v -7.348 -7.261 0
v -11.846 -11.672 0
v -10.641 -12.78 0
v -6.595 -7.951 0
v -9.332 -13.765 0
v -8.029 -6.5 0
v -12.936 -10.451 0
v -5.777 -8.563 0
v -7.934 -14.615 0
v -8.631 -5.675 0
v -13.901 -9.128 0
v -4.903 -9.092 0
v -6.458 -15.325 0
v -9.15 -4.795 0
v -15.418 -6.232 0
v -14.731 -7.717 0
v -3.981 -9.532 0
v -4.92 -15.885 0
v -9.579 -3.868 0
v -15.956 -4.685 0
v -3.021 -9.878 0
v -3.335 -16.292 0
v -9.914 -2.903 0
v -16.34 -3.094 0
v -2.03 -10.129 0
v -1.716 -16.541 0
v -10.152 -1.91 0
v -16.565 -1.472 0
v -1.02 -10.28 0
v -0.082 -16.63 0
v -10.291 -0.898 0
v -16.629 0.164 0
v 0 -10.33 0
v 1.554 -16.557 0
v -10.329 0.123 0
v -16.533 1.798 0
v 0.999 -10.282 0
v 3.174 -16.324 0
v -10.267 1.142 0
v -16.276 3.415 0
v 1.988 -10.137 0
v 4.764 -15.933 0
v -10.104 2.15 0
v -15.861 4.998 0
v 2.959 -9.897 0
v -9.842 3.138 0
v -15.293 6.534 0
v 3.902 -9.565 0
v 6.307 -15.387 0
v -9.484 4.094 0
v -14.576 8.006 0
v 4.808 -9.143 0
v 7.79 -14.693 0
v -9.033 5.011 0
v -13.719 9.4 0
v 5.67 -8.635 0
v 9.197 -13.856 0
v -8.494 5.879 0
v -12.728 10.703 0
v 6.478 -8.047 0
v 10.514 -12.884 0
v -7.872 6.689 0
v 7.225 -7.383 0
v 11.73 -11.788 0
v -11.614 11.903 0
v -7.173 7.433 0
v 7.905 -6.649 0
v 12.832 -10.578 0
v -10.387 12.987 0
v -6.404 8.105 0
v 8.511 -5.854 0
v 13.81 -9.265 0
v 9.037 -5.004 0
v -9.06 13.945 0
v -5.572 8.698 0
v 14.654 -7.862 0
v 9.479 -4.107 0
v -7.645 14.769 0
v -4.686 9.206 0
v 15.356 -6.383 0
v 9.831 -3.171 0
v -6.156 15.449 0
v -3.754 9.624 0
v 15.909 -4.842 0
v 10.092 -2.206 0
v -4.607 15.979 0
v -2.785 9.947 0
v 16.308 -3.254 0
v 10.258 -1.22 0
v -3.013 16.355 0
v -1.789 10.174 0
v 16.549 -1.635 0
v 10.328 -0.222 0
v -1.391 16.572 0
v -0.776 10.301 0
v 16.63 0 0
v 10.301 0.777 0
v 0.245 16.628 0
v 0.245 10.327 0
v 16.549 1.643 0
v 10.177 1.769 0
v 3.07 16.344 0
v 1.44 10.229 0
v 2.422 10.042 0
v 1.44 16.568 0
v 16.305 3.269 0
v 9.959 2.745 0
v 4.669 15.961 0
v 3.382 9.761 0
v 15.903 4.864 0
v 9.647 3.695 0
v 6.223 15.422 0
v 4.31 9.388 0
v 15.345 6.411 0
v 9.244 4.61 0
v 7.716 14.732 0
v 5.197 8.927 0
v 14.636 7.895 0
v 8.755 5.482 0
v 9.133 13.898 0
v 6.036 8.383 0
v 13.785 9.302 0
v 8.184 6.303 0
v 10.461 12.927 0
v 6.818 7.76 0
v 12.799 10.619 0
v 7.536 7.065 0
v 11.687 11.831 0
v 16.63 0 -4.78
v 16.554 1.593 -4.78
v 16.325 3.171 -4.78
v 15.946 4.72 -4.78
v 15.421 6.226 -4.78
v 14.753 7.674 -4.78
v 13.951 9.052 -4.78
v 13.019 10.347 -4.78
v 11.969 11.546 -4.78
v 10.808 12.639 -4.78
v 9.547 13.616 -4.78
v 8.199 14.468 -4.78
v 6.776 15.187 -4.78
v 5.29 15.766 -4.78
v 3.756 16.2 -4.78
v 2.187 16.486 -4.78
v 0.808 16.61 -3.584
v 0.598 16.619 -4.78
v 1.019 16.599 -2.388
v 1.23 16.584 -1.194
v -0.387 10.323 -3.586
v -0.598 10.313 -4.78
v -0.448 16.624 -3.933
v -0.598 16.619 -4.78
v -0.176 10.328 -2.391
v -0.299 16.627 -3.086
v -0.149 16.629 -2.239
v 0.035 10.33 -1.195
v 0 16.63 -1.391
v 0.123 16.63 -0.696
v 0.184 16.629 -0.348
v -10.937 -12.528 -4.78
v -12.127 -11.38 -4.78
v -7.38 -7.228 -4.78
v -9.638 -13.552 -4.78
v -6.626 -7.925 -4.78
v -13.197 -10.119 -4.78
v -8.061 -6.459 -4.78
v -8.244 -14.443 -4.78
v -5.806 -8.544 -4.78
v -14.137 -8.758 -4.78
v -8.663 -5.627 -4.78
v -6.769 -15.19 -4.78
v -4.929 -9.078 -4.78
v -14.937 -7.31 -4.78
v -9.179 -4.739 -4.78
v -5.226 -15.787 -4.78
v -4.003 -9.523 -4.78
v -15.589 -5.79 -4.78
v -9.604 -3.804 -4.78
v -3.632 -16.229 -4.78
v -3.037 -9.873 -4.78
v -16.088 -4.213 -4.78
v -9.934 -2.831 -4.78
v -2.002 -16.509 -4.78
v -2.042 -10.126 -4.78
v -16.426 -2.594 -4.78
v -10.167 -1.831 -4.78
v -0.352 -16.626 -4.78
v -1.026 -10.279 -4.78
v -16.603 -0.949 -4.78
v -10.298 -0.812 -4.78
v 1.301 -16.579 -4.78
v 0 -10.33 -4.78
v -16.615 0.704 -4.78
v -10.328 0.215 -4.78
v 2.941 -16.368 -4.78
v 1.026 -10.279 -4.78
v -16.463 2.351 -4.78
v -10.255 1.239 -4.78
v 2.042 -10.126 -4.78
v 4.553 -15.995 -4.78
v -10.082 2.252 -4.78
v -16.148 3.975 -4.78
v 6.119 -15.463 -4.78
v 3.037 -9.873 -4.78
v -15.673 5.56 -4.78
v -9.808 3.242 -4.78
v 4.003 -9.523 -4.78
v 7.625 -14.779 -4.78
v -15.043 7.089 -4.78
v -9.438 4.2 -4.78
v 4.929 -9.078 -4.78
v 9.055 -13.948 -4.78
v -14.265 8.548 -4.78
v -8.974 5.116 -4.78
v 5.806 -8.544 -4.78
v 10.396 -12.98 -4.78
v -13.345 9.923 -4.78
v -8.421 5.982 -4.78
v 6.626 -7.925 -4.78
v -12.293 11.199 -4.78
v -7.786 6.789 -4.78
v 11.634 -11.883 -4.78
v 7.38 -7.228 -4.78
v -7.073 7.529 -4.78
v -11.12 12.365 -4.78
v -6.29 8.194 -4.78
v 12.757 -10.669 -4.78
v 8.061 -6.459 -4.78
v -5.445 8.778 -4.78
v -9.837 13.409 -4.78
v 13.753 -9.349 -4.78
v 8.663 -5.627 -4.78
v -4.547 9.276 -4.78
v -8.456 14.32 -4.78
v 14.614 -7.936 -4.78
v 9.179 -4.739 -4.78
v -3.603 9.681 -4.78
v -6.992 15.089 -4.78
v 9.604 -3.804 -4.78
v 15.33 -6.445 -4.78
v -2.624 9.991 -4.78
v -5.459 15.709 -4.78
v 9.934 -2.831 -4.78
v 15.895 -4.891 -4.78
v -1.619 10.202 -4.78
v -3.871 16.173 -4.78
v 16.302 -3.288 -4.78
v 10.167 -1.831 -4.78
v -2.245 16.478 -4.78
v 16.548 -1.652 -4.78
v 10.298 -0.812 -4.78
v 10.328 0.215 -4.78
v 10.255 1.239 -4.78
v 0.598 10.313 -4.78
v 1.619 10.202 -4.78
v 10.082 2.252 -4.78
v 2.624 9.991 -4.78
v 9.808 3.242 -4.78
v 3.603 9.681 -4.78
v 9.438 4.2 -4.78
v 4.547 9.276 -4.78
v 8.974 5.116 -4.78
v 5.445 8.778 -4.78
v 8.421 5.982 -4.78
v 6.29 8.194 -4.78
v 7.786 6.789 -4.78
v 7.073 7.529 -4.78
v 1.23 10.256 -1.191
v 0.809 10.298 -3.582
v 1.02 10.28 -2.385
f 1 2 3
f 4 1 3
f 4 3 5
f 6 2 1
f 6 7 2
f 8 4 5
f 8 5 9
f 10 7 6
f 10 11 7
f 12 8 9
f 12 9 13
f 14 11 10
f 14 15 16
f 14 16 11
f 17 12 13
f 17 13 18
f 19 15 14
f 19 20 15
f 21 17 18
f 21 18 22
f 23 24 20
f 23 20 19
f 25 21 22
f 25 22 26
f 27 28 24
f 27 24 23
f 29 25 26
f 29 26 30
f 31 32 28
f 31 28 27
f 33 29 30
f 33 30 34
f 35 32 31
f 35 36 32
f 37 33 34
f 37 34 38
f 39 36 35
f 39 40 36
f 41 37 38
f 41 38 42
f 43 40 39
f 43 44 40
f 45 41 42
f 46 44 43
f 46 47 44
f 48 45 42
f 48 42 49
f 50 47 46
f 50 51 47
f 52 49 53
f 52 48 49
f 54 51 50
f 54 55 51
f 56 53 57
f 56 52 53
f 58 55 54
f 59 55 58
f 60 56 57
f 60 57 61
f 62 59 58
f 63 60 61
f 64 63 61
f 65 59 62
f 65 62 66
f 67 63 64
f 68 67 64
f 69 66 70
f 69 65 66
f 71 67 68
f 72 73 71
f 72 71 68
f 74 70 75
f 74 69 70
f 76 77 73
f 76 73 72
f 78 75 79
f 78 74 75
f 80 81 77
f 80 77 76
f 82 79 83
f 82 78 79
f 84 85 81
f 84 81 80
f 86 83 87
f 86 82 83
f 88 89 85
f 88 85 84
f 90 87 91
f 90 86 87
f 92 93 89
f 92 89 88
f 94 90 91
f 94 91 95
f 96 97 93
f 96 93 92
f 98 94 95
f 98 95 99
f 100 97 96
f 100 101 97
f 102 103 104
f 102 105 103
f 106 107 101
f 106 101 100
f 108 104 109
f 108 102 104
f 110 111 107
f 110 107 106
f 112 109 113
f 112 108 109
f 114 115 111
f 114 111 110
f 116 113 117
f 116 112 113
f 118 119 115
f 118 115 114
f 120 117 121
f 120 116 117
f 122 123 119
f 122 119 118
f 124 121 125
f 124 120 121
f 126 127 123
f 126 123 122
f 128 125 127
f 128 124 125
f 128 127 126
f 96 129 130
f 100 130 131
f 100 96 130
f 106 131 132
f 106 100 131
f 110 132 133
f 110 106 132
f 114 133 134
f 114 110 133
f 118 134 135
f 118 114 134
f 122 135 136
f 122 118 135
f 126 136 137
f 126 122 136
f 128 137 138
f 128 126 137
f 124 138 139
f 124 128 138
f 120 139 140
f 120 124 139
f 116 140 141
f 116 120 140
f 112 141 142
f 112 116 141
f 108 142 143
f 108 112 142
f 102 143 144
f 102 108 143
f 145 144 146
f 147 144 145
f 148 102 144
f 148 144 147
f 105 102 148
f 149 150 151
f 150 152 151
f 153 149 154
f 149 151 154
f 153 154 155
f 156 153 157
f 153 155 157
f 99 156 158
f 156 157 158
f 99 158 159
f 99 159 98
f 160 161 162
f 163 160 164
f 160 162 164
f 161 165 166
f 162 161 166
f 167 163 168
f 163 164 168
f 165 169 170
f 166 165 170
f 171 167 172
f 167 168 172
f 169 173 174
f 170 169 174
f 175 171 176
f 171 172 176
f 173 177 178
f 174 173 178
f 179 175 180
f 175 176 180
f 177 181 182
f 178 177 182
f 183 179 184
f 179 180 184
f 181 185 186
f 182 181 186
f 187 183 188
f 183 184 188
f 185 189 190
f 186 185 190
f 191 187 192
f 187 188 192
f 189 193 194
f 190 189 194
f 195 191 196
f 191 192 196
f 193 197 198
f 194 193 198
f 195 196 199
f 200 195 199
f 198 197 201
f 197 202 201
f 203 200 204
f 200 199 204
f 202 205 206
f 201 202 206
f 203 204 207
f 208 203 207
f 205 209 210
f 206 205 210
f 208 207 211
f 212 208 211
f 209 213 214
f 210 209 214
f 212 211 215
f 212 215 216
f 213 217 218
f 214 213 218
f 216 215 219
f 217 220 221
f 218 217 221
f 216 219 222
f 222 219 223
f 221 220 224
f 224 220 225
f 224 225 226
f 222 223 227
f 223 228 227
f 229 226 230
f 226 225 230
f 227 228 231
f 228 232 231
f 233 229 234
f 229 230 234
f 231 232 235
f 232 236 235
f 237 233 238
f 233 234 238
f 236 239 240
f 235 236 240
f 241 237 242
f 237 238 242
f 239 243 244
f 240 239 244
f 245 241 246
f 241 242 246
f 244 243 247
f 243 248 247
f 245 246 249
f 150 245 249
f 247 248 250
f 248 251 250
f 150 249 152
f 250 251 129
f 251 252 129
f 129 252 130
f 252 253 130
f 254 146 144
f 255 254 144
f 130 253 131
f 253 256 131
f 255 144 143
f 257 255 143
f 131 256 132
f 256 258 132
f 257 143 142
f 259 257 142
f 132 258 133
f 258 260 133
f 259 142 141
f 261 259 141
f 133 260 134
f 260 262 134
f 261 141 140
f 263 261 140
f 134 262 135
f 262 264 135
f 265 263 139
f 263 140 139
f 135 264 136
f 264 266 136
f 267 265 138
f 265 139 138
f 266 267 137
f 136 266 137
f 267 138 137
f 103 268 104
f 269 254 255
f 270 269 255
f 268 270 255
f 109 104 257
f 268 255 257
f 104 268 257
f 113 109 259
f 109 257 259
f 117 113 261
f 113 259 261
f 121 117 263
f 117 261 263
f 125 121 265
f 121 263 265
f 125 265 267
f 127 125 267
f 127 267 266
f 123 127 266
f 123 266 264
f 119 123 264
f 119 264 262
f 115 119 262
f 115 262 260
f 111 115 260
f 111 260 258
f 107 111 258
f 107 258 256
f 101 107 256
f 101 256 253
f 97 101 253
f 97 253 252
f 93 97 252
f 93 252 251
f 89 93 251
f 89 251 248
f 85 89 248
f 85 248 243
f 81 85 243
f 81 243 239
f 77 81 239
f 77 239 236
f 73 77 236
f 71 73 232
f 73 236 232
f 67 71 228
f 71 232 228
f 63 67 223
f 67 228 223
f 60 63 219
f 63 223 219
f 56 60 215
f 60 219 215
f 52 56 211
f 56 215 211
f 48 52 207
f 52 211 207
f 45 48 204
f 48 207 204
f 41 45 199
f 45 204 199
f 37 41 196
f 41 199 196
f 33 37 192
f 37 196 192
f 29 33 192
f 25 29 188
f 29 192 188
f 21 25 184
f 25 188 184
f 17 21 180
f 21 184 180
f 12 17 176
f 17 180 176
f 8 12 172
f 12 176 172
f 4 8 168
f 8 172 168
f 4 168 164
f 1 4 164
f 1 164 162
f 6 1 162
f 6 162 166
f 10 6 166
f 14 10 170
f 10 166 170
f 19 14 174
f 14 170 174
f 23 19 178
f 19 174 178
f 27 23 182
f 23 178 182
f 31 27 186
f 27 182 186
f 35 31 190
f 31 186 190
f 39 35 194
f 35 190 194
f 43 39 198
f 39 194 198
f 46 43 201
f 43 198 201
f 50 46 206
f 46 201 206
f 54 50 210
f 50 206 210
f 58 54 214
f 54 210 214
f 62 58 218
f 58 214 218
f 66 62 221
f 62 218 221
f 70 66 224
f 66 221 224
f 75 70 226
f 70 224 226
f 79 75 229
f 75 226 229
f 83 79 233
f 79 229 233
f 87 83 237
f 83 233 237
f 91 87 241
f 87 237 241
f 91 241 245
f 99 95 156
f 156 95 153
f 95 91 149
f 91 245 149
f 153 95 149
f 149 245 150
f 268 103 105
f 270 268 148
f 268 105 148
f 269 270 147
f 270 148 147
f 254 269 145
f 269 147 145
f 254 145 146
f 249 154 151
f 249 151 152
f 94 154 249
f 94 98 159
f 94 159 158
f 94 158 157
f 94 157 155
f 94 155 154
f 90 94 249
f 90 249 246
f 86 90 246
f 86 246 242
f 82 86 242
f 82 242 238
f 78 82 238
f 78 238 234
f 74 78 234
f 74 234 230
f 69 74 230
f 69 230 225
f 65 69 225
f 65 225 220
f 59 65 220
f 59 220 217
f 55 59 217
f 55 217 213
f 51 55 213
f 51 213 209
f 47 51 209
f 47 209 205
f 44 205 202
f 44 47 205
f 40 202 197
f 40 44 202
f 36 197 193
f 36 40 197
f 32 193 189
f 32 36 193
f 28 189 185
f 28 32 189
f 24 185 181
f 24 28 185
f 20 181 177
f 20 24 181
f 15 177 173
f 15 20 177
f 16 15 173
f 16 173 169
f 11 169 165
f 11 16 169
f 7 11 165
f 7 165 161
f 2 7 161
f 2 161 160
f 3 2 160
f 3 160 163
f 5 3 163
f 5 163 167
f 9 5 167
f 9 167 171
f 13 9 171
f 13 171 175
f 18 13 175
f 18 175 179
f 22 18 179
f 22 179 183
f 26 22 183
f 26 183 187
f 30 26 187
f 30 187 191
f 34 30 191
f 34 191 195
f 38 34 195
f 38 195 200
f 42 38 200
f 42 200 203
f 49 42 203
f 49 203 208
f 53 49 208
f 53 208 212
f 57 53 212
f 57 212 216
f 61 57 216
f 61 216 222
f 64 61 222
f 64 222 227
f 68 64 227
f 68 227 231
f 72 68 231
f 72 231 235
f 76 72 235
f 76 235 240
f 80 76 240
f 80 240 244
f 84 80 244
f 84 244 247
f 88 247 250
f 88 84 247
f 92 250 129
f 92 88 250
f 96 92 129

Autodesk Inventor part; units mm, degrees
ref_plane "WorkPlane1" through (0, 0, 0) normal (0, 0, 1) x (1, 0, 0)
ref_plane "WorkPlane3" through (0, 0, -4.78) normal (0, 0, 1) x (1, 0, 0)
ref_plane "Work Plane3" through (0, -16.63, 0) normal (0, 1, 0) x (-1, 0, 0)
ref_plane "WorkPlane10" through (0, 16.63, 0) normal (0, 1, 0) x (-1, 0, 0)
sketch "Sketch1" plane through (0, 0, 0) normal (0, 0, 1) x (1, 0, 0)
  point P0 (0, 0)
sketch "Sketch2" plane through (0, 0, 0) normal (0, 0, 1) x (1, 0, 0)
  circle A0 centre (0, 0) radius 16.63
  dimension "d3" = 33.26
extrude "Extrusion1" add sketch "Sketch2" against normal blind 4.78
sketch "Sketch3" plane through (0, 0, -4.78) normal (0, 0, 1) x (1, 0, 0)
  point P0 (0, 0)
sketch "Sketch4" plane through (0, 0, 0) normal (0, 0, 1) x (1, 0, 0)
  circle A0 centre (0, 0) radius 16.63 projected
hole "Hole1" at (0, 0, 0) direction (0, 0, -1) diameter 20.66 end through all
sketch "Sketch5" plane through (0, 16.63, 0) normal (0, 1, 0) x (-1, 0, 0)
  line L0 (-0.2453, 0) -> (-1.4403, 0)
  line L1 (0.5975, -4.78) -> (-0.2453, 0)
  line L2 (-0.5975, -4.78) -> (0.5975, -4.78)
  line L3 (-1.4403, 0) -> (-0.5975, -4.78)
  line L4 (-10.33, 0) -> (10.33, 0) construction
  line L5 (16.63, -4.78) -> (-16.63, -4.78) construction
  line L6 (0, -5.736) -> (0, 0.956) projected
  dimension "d15" = 80
  dimension "d18" = 0.5975
  dimension "d19" = 0.5975
extrude "Extrusion2" cut sketch "Sketch5" against normal blind 16.63
ref_plane "MSC_PT1" through (0, 0, 0) normal (0, 0, 1) x (1, 0, 0)
ref_plane "MSC_PT2" through (0, 0, -4.78) normal (0, 0, -1) x (-1, 0, 0)
equation "\"d7\" = Diam1"
equation "\"d4\" = ParH"
equation "\"d18\" = 0.125 * ParH"
equation "\"d19\" = 0.125 * ParH"
equation "\"d16\" = 0.5 * Diam2"
equation "\"d3\" = Diam2"
equation "\"Diam2\" = 33.26"
equation "\"ParH\" = 4.78"
equation "\"Diam1\" = 20.66"
equation "\"d20\" = 0.5 * Diam2"
properties part number "ASME B18.21.2M - 20" material "Steel, Mild"
